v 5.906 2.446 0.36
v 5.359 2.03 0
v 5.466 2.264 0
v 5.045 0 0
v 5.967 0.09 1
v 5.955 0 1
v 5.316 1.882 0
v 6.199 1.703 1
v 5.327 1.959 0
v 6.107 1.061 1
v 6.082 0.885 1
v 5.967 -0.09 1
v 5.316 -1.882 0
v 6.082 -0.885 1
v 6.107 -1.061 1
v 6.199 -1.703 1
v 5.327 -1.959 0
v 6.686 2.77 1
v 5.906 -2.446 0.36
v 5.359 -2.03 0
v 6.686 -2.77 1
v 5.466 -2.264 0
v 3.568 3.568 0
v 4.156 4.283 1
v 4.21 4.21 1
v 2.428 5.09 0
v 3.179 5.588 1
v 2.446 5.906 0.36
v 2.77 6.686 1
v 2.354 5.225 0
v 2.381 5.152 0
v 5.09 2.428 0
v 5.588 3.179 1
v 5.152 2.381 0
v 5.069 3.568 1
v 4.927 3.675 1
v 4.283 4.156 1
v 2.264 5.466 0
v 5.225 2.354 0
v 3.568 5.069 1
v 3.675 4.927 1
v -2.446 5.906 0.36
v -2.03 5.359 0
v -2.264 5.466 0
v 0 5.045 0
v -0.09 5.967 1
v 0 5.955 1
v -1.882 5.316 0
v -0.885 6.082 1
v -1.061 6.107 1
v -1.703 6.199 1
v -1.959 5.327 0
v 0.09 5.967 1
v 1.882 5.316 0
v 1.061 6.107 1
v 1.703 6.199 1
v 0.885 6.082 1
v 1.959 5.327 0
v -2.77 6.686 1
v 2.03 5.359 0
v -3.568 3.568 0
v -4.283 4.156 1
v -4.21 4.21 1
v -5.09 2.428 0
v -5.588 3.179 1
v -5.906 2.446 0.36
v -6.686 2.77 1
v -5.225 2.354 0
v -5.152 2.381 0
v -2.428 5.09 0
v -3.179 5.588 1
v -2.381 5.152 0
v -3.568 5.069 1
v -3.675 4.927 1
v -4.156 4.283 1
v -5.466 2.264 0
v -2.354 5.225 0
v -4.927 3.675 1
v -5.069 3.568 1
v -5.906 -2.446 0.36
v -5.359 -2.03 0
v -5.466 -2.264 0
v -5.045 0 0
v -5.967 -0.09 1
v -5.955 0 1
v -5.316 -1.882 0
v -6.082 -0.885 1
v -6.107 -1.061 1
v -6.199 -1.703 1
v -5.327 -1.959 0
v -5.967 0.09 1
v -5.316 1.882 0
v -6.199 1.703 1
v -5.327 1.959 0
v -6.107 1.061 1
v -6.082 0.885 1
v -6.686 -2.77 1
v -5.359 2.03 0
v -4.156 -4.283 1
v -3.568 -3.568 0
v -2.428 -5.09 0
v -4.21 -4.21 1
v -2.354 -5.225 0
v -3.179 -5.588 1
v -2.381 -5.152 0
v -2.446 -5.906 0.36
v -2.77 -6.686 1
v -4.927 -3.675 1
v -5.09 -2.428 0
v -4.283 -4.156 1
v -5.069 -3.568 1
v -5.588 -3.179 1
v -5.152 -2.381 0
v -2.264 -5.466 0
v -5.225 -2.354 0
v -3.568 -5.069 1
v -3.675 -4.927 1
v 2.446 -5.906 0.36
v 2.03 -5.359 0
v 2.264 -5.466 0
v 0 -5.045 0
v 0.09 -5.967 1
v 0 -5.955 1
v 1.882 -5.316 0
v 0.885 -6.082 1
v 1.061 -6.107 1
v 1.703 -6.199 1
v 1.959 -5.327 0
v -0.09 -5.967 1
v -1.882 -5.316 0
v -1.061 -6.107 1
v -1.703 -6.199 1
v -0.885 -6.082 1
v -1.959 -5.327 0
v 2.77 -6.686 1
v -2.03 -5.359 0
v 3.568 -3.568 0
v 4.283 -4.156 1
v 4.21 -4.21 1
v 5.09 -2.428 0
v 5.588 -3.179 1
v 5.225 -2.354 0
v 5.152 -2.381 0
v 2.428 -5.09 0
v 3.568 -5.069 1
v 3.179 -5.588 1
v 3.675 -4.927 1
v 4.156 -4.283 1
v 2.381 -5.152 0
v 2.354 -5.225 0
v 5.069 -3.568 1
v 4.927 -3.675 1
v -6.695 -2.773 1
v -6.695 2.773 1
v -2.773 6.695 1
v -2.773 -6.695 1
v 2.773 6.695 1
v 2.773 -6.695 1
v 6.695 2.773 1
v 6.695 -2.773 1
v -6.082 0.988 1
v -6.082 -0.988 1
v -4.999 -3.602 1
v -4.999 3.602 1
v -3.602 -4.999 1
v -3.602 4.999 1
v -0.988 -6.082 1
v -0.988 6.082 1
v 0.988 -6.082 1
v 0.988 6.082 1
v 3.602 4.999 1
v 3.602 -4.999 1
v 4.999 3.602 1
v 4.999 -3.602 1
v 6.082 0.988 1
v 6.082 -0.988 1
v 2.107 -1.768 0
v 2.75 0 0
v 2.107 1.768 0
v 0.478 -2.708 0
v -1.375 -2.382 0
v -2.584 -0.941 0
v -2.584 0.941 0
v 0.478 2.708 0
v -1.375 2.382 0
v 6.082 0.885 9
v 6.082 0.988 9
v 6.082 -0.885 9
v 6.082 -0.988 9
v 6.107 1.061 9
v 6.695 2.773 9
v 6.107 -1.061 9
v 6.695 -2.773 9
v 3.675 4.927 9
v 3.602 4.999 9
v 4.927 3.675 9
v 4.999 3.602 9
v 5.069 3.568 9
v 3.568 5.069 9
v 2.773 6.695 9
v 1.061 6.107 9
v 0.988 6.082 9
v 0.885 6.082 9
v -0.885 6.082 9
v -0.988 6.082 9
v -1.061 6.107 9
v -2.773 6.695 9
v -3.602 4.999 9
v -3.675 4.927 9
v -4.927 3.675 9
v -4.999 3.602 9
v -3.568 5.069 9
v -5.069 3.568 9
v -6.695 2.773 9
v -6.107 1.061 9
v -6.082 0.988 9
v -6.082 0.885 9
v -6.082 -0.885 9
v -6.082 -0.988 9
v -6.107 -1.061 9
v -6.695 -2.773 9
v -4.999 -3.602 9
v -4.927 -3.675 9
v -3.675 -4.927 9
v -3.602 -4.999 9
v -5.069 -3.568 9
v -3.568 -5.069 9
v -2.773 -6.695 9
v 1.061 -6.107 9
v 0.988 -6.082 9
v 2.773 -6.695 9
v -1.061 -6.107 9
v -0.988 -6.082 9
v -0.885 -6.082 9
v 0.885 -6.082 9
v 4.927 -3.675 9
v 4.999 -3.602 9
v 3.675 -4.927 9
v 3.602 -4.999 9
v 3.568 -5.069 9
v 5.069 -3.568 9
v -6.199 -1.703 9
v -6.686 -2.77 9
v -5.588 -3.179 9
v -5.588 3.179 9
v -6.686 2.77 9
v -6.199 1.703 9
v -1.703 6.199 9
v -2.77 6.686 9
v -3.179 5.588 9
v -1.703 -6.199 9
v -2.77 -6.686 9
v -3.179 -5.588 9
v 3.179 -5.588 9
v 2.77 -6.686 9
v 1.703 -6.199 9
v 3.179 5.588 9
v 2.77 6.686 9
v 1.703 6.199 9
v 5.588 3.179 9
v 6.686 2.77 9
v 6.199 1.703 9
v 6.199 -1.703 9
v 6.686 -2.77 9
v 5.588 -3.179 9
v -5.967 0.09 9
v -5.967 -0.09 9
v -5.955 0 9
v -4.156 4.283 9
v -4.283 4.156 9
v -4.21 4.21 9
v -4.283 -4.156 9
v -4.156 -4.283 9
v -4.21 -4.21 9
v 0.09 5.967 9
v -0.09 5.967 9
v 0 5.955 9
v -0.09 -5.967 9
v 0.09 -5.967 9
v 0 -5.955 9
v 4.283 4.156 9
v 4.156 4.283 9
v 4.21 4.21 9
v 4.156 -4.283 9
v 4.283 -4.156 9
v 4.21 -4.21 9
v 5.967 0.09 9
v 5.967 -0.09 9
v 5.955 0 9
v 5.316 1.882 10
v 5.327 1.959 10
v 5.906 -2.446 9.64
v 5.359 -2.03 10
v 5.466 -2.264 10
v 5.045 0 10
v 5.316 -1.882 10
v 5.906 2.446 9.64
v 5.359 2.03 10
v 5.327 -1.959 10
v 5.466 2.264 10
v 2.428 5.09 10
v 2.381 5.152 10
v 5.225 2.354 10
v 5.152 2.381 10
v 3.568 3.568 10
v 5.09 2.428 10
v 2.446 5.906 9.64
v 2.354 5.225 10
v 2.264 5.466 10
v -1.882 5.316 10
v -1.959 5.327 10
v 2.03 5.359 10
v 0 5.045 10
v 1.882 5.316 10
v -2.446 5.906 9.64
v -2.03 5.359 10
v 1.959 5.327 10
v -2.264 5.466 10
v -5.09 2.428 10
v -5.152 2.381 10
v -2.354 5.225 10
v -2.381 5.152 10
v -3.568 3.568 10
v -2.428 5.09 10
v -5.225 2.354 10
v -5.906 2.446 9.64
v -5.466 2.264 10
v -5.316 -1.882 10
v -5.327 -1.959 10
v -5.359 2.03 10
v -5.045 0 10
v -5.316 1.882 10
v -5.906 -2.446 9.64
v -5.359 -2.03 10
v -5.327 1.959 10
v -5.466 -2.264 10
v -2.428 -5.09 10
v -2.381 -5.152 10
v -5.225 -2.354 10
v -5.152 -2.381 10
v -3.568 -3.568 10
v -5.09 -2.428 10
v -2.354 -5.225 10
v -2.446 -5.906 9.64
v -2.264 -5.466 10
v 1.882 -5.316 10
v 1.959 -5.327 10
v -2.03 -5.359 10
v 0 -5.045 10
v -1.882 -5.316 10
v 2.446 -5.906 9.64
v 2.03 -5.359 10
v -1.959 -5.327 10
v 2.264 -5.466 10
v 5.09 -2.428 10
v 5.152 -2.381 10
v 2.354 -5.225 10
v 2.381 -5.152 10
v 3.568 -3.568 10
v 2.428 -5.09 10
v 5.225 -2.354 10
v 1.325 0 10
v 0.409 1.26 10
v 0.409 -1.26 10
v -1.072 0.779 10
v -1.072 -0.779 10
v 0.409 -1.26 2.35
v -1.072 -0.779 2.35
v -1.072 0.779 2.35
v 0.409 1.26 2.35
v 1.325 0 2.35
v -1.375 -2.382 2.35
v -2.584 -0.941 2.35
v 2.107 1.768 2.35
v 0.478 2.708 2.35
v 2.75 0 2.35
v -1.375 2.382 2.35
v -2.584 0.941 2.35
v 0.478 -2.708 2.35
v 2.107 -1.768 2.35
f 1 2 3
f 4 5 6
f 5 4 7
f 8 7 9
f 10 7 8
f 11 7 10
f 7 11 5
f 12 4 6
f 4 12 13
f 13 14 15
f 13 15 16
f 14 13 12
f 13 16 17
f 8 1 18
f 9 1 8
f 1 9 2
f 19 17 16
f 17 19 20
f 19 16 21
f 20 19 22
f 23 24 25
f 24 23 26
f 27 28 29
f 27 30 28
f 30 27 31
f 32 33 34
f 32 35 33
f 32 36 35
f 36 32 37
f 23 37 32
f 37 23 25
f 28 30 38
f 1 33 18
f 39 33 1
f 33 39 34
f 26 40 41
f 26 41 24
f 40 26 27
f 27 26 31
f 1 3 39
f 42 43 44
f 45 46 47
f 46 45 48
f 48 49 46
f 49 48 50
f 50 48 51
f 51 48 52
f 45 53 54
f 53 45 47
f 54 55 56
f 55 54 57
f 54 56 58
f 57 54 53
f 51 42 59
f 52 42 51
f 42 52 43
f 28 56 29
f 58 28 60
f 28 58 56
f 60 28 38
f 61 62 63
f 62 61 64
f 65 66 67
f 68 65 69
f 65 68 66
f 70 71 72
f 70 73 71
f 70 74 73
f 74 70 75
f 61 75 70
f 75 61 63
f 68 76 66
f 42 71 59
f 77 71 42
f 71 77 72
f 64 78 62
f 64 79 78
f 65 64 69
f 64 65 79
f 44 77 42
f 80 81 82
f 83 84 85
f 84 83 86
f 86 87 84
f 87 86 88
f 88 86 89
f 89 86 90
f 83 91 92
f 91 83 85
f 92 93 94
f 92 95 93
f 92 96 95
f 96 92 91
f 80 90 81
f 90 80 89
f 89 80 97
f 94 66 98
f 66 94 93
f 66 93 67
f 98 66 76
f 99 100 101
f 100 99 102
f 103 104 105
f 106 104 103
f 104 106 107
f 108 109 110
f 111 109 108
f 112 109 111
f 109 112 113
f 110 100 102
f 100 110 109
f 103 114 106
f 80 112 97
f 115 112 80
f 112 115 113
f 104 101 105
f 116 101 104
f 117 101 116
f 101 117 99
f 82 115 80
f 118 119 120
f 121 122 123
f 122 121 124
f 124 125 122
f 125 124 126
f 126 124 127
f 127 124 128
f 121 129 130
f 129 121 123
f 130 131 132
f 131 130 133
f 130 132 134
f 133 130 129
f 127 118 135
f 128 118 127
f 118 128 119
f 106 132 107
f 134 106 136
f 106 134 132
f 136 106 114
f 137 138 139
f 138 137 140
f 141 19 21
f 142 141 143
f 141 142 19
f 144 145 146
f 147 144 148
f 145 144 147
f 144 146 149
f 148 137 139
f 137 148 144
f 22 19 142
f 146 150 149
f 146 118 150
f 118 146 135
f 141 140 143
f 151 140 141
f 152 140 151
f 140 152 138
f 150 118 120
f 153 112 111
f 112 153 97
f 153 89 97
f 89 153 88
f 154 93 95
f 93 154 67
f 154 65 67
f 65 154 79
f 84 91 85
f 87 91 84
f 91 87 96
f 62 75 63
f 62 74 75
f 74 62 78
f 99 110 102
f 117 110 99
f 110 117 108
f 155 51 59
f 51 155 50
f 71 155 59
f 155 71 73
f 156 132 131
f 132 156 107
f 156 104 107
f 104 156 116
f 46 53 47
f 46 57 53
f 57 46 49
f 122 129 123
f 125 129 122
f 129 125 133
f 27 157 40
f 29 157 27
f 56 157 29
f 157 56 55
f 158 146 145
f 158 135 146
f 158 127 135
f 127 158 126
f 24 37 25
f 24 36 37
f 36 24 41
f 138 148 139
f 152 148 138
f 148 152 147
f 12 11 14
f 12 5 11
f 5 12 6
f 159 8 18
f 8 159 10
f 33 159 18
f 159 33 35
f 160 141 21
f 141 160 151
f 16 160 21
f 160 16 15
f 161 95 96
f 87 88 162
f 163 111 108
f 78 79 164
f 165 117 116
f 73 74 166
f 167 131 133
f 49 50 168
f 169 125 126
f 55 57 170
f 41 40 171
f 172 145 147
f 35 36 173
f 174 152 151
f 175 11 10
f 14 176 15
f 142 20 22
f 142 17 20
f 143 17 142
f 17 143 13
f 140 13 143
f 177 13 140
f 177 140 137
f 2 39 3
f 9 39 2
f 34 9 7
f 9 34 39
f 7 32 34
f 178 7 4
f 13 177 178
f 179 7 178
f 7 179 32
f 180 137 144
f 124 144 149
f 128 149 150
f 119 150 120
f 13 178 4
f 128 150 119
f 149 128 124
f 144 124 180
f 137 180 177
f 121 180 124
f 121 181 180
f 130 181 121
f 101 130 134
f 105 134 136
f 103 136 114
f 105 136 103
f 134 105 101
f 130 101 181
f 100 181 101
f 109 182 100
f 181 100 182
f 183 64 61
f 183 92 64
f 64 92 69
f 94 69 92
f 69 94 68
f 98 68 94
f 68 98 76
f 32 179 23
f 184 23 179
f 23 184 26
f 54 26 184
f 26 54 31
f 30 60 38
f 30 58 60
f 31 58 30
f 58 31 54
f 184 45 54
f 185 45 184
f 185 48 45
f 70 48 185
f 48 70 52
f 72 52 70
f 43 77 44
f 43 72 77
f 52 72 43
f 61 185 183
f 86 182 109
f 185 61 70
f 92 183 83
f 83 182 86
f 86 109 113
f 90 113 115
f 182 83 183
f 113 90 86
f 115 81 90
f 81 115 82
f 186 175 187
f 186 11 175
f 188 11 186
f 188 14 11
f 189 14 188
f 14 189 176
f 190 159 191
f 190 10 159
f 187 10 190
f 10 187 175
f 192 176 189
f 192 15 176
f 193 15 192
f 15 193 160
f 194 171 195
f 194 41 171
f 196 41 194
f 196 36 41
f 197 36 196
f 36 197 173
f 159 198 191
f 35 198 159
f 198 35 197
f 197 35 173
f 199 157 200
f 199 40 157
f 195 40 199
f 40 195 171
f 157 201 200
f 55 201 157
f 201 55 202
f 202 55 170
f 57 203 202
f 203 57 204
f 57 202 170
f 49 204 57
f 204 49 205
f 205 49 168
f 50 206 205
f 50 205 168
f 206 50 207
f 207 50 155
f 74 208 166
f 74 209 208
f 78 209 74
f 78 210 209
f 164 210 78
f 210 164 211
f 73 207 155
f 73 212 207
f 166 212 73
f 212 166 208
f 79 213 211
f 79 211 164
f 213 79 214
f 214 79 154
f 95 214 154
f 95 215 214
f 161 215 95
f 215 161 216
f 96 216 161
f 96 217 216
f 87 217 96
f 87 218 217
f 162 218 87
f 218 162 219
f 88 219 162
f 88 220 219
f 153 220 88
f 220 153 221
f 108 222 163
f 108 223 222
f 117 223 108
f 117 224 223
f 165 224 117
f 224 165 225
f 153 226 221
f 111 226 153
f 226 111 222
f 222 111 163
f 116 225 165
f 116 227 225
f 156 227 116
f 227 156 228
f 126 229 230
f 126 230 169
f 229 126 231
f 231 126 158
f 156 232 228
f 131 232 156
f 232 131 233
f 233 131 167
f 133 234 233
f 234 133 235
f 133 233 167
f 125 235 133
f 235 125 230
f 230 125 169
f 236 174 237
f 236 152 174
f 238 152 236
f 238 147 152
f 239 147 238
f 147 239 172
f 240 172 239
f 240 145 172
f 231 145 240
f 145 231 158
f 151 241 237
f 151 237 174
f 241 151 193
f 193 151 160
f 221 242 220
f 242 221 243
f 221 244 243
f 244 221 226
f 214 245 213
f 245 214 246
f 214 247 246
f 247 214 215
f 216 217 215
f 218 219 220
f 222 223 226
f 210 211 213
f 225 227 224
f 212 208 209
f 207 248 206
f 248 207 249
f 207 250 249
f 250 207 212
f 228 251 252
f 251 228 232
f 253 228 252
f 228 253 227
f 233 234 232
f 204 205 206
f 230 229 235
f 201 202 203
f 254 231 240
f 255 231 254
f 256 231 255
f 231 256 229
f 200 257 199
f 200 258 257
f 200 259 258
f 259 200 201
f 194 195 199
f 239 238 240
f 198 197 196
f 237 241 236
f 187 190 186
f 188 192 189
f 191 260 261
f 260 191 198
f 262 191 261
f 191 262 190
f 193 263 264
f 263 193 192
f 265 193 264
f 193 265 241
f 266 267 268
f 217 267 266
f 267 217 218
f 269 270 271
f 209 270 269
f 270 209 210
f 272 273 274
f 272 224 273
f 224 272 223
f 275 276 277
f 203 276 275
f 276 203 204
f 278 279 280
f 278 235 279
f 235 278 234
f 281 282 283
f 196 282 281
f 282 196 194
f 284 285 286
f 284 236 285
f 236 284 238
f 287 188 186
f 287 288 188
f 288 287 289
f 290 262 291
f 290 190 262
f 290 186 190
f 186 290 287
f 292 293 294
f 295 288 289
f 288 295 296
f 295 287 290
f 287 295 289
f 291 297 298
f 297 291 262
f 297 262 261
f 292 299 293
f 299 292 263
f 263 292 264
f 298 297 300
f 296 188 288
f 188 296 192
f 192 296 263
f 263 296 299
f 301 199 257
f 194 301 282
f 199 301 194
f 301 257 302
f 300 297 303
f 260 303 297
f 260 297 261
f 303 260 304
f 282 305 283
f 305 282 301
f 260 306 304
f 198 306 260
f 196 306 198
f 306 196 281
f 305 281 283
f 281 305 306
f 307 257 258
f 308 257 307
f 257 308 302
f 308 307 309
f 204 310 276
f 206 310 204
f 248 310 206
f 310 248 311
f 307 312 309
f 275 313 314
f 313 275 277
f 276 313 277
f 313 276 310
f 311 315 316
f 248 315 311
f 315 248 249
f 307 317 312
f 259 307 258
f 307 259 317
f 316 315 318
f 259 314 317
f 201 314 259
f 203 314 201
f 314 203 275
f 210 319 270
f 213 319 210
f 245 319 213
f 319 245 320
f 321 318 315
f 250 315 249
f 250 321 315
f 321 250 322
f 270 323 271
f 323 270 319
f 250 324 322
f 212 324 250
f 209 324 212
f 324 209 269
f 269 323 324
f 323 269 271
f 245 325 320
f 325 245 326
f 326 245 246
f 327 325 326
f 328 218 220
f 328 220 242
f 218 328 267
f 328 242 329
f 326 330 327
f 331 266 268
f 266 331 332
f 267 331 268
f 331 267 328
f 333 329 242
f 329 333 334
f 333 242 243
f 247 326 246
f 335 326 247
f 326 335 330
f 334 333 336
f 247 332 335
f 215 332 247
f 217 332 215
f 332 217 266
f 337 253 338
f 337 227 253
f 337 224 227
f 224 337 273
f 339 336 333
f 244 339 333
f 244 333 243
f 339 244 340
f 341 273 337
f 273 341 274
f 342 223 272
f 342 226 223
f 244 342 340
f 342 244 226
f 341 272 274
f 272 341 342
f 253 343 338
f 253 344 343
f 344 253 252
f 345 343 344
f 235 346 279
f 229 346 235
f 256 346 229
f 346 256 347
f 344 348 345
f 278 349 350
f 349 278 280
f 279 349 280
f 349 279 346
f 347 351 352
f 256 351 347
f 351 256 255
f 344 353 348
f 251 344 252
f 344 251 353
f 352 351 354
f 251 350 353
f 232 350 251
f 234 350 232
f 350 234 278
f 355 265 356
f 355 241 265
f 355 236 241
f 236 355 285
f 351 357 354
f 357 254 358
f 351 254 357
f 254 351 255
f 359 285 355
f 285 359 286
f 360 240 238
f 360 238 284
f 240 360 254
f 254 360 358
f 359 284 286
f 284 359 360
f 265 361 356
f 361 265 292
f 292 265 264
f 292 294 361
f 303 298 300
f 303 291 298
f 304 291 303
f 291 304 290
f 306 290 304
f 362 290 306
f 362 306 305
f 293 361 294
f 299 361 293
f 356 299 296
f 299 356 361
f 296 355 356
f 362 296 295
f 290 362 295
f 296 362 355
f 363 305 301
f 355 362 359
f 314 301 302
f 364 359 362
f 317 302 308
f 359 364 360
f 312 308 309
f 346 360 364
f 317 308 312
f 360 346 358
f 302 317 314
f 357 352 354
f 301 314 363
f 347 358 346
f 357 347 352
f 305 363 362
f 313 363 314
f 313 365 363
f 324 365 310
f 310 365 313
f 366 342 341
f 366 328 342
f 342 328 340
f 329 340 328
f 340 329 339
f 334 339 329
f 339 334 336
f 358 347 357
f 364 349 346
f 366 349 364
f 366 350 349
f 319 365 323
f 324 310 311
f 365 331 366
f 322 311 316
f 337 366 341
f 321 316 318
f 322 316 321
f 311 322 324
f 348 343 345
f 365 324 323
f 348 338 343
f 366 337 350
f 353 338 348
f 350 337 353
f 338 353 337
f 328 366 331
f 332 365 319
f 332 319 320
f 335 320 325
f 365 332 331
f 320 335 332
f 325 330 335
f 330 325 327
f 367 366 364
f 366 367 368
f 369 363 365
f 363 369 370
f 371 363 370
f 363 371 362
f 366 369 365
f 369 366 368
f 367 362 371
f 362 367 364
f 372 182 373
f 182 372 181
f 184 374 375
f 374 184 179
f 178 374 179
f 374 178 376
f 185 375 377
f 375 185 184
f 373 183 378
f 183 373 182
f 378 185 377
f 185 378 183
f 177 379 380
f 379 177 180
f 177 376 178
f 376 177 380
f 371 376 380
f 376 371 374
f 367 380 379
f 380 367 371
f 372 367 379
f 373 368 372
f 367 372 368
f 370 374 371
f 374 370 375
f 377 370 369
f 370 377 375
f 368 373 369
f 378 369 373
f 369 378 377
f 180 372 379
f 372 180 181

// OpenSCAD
/*
Universal Thumbnut/Socket Knob Design
By: Harrison Fast (2013)

This is a parametric script for a thumb knob which can be used on either a nut, hex head cap screw, or socket head cap screw.
Options include:
unit of measure (metric, imperial)
thread size []
pocket type (Constant_Wall_Thickness, Solid, Circular)
knob diameter
number of rosettes (fingers/cutouts)
size and position of rosette
wall thickness
top wall thickness

Should work in the Thingiverse Customizer

*/

//****Variables - To be Set****\\
//CUSTOMIZER VARIABLES

//What's This Knob For?
Knob_Type=3;//[1:Nut,2:Hex Head Screw,3:Socket Head Screw]

//What Size Nut or Screw? 
Thread_Size=3; //[0:M1.6,1:M2,2:M2.5,3:M3,4:M4,5:M5,6:M6,7:M8,8:M10,9:M12,10:M14,11:M16,12:M20]

//What Kind of Pocket Do You Want?
Knob_Fill=2;//[1:Constant Wall Thickness,2:Solid,3:Circular Cut-Out]

//How Big Should The Knob Be?
Knob_Diameter = 18;
knob_r = Knob_Diameter/2;

//How Thick Should the Grip Be? (Overall Height)
Knob_Thickness=10;
knob_t=Knob_Thickness*1;

//How Thick Should The Walls Be?
Wall_Thickness=1.5;

//How Many Prongs Should It Have?
Number_of_Rosettes=8; //[1:16]

//How Big Should The Finger Dents Be?
Rosette_Radius=6; 

//How Far Should The Finger Dents be From The Knob Circumference? (This lets you use larger radii by moving the center of the cut-out cylinder away from the center of the knob)
Rosette_Offset = 3;

//How Big Should the Bevel Be?
Chamfer_Size=1;
r_cham = Chamfer_Size*1; //Too lazy to change the proper names to Chamfer_Size

//How Much Clearance Do You Want? 0 probably won't work.
Clearance=.25; //[0:.125:1];

//CUSTOMIZER VARIABLES END


//$fa=6;


echo(knob_t);
knob_hex(); //main function call


//****MODULES***\\

module hex_trude(hex_width,hex_height) //makes a hexagonal prism at hex_width
	{	
		s = hex_width/1.732;
		l_x=s/2;
		l_y=.866*s;
		a_1 = [ [s,0],[l_x,-l_y],[-l_x,-l_y],[-s,0],[-l_x,l_y],[l_x,l_y]];
		b=[0:5];
		linear_extrude (height = hex_height) polygon(a_1,b);
	}


module pocket(hex_width,hex_height)
{	
	if(Knob_Fill==1){
		difference() {
			 translate([0,0,Wall_Thickness]) {cylinder(h=hex_height, r=knob_r-Wall_Thickness);} //wall offset
				for(i=[0:Number_of_Rosettes-1]) {
					rotate([0,0,360*i/Number_of_Rosettes]) 
						translate([knob_r+Rosette_Offset,0,0]) {
							cylinder(h = Wall_Thickness+hex_height, r = Rosette_Radius+Wall_Thickness); } //wall offset rosette
								}
	}//endif
					}

	else if(Knob_Fill==2){
	}//endif

	else if(Knob_Fill==3) {
		translate([0,0,Wall_Thickness]) {
			cylinder(h=hex_height,r=knob_r-Wall_Thickness-Rosette_Radius+Rosette_Offset);
						}
	}//endif
			
} //end module pocket()



module knobby_base_parts(knob_r, knob_h, rA, rB)
{
	difference()
	{
		cylinder(h=knob_h,r1=knob_r-rA,r2=knob_r-rB);
		for(i=[0:Number_of_Rosettes]){
			rotate(360*i/Number_of_Rosettes,[0,0,1]) translate([knob_r+Rosette_Offset,0,-0.05])
				cylinder(h=knob_h+.1,r1=Rosette_Radius+rA,r2=Rosette_Radius+rB);
		} //end if
	} //end difference
} //end knobby_base_parts



module knobby_base(hex_width,hex_height,r_cham)
{
	difference(){
			union() {
				knobby_base_parts(knob_r,r_cham,r_cham,0);
				if(hex_height<Wall_Thickness){
					union() {
						translate([0,0,r_cham]) knobby_base_parts(knob_r,Wall_Thickness-2*r_cham,0,0); 
						translate([0,0,Wall_Thickness]) knobby_base_parts(knob_r, r_cham,0,r_cham);}}

				else {translate([0,0,r_cham]) knobby_base_parts(knob_r,hex_height-2*r_cham,0,0);
					union() {
						translate([0,0,r_cham]) knobby_base_parts(knob_r,hex_height-2*r_cham,0,0); 
						translate([0,0,hex_height-r_cham]) knobby_base_parts(knob_r, r_cham,0,r_cham); }}
				} //end union
			pocket(hex_width,hex_height+1);
					} //end difference
} //end knobby_base


module make_knob(hex_width,hex_height,r_cham)
{
	if(Knob_Type==1){
	difference(){
			union(){
			rotate(0,[0,0,1]) {
			difference(){
				knobby_base(hex_width,knob_t,r_cham);
				translate([0,0,Wall_Thickness])hex_trude(hex_width+.25,hex_height+1+knob_t);
				}}
			translate([0,0,Wall_Thickness]) {
				difference() {
					hex_trude(hex_width+Wall_Thickness*2,hex_height);
					hex_trude(hex_width+.25,hex_height+.1);}
					}}
		translate([0,0,-.1]) cylinder(h=Wall_Thickness+hex_height+.2, r = Thread_Size/2+.25);
	 } 	//end Difference
	} //end if

	else if(Knob_Type==2) {
	difference() {
		union() {
			knobby_base(hex_width,knob_t,r_cham);
			cylinder(h=hex_height+Wall_Thickness, r=hex_width/2+Wall_Thickness);
			} //end union
		translate([0,0,-.05]) hex_trude(hex_width+.25,hex_height);
		translate([0,0,-.5]) cylinder(h=hex_height+Wall_Thickness+1+knob_t, r=thread_d[Thread_Size]/2+.125);
		}//end difference
	}//end if
			

	else if(Knob_Type==3) {
	difference(){
		union() {
			knobby_base(hex_width,knob_t,r_cham);
			cylinder(h=hex_height+Wall_Thickness, r=hex_width/2+Wall_Thickness);
		}//end union
			translate([0,0,-.05]) cylinder(h=hex_height+Knob_Thickness, r=hex_height/2+.125);
			translate([0,0,-.05]) cylinder(h=hex_height, r=hex_width/2);
	} //end difference
		} //end if
} //end module make_knob_hex


module knob_hex(){
	if (Knob_Type==1 || 2){
		make_knob(hex_w_table[Thread_Size],hex_h_table[Thread_Size],r_cham);
		}//end if
	else if (Knob_Type==3){
		make_knob(shcs_d_table[Thread_Size],thread_d[Thread_Size],r_cham);
} //end_if
} //end knob_hex

//****END KNOB BUILDING****\\

//****LOOKUP TABLES****\\

//----Lookup----\\

//----Thread Outer Diameter----\\\\
thread_d=[1.6,2,2.5,3,4,5,6,8,10,12,14,16,20,24];

//----Hex Width----\\
hex_w_table=[3.2,4,5,5.5,7,8,10,13,16,18,21,24,30,36];

//----Hex Height----\\
hex_h_table=[1.3,1.6,2,2.4,3.2,4.7,5.2,6.8,8.4,10.8,12.8,14.8,18,21.5];

//----Hex Head Height----\\
hex_head_height=[1.3,2,2.1,2.1,2.9,3.5,4.1,5.4,6.5,7.6,8.8,10,12.5,15];

//----SHCS Diameter----\\
shcs_d_table=[2.5,3.8,4.2,5.5,7,8.5,10,13,16,18,21,24,27,30];
//----SHCS Height = Thread Size!---\\
